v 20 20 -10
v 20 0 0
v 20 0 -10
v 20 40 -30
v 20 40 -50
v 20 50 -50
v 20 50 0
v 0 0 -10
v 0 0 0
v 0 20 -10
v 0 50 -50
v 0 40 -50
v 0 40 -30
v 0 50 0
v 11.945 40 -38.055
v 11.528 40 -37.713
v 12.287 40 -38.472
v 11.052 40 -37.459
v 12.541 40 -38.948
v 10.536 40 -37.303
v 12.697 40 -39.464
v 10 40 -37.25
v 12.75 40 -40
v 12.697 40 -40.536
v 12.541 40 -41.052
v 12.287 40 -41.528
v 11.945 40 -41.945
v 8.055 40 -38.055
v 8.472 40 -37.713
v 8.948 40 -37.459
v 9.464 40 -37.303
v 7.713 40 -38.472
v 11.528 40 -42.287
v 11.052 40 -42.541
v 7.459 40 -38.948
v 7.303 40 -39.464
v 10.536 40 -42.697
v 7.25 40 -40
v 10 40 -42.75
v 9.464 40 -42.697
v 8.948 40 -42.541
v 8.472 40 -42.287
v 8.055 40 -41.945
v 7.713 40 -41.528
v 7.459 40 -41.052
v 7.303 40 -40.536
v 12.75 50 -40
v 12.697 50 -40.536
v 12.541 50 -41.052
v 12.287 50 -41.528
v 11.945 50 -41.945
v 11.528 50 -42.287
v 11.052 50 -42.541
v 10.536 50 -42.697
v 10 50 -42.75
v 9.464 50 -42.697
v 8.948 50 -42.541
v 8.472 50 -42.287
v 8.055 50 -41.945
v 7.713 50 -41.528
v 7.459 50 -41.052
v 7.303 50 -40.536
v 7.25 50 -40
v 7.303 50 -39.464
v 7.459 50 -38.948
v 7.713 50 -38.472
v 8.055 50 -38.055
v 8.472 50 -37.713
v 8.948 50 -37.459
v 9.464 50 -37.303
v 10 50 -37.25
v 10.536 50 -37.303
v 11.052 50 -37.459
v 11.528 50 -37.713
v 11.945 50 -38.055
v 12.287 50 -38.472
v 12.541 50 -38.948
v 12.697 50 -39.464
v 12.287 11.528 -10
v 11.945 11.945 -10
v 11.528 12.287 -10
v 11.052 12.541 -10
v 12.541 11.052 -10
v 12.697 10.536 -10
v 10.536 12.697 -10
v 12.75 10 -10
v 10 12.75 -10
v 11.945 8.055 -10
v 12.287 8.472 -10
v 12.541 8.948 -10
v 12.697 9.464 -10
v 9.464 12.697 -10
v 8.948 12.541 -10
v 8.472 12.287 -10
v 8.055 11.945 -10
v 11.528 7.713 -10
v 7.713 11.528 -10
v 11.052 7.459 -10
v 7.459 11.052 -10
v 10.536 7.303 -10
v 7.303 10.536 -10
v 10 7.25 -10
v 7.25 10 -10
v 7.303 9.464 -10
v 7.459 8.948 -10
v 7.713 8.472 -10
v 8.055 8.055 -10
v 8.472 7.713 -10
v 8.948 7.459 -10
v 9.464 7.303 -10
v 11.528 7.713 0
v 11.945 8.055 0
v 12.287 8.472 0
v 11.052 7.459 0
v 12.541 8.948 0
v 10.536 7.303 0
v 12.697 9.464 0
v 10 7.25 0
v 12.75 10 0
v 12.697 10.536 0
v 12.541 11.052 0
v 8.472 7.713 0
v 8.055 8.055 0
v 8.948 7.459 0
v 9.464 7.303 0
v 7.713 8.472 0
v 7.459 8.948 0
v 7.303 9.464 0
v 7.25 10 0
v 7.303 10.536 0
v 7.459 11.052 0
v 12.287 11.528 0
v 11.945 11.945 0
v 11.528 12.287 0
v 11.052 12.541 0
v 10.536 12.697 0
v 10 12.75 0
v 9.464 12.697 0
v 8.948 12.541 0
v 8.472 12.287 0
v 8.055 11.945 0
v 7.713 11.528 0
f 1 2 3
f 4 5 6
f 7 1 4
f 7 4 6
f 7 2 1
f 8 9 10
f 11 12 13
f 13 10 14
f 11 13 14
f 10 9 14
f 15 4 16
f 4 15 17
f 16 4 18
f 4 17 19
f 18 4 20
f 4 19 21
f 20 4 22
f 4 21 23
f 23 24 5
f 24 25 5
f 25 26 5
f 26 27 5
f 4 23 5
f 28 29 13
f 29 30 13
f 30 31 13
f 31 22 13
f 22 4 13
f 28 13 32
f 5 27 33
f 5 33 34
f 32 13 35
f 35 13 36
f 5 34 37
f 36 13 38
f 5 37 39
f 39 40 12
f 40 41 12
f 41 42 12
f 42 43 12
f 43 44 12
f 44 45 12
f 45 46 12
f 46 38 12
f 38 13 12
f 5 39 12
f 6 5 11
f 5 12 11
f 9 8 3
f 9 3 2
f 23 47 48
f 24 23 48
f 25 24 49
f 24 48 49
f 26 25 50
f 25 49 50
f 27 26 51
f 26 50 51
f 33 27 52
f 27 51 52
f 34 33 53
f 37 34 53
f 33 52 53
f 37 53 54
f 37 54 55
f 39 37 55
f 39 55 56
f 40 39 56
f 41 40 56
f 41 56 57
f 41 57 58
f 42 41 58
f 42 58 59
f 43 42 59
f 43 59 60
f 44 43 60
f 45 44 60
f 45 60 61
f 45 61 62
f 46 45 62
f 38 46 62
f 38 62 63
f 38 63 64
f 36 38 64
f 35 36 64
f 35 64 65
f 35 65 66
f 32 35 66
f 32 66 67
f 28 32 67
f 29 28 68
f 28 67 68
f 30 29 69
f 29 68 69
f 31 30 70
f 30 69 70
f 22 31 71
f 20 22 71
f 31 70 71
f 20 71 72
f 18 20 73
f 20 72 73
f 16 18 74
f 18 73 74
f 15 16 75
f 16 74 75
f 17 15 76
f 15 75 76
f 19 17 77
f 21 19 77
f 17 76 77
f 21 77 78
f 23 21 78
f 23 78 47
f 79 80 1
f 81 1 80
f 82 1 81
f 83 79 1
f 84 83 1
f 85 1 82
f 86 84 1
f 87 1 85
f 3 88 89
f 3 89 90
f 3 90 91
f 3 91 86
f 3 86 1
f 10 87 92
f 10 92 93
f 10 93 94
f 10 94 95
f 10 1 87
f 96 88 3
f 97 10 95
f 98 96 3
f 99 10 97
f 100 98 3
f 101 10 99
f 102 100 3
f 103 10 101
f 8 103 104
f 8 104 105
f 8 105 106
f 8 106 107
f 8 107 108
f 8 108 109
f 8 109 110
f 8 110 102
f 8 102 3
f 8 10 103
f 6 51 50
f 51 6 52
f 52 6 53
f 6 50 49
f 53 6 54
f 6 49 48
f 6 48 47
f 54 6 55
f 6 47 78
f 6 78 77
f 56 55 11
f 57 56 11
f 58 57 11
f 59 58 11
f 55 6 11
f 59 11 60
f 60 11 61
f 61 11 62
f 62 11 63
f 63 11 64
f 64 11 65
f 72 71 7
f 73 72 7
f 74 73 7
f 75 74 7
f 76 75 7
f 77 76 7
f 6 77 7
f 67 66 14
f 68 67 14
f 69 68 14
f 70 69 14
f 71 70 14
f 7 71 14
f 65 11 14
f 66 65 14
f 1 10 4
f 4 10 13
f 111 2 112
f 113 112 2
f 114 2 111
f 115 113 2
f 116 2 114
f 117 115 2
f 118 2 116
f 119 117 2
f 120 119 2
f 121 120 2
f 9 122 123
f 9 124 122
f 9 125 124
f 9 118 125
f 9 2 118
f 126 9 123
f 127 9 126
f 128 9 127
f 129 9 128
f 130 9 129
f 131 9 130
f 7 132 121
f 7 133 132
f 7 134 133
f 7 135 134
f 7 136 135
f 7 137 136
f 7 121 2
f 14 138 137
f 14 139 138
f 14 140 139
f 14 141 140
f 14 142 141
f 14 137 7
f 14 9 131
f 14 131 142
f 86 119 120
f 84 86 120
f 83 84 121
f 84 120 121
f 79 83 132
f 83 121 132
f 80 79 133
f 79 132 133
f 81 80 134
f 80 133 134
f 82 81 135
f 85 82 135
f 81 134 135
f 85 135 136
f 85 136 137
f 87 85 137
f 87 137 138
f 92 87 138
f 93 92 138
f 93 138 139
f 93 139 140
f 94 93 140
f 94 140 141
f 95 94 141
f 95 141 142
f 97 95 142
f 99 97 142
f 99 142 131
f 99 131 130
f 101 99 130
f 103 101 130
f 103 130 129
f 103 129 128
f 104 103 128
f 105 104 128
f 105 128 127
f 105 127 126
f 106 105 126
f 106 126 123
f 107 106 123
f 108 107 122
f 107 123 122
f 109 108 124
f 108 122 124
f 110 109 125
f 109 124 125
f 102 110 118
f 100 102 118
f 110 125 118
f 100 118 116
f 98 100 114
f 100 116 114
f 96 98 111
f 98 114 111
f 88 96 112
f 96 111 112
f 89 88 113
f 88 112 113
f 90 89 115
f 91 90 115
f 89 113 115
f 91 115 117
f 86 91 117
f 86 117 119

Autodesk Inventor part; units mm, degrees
ref_plane "YZ Plane" through (0, 0, 0) normal (1, 0, 0) x (0, 1, 0)
ref_plane "XZ Plane" through (0, 0, 0) normal (0, 1, 0) x (-1, 0, 0)
ref_plane "XY Plane" through (0, 0, 0) normal (0, 0, 1) x (1, 0, 0)
sketch "Sketch1" plane through (0, 0, 0) normal (1, 0, 0) x (0, 1, 0)
  line L0 (0, 0) -> (20, 0)
  line L1 (20, 0) -> (20, -10)
  line L2 (20, -10) -> (0, -10)
  line L3 (0, -10) -> (0, 0)
  line L4 (20, -10) -> (50, -10)
  line L5 (50, -10) -> (50, 0)
  line L6 (50, 0) -> (20, 0)
  line L7 (20, 0) -> (20, -10)
  line L8 (50, 0) -> (40, 0)
  line L9 (40, 0) -> (40, -50)
  line L10 (40, -50) -> (50, -50)
  line L11 (50, -50) -> (50, 0)
  line L12 (40, -50) -> (50, -50)
  line L13 (50, -50) -> (50, -30)
  line L14 (50, -30) -> (40, -30)
  line L15 (40, -30) -> (40, -50)
  line L16 (20, -10) -> (40, -30)
  line L17 (40, -10) -> (20, -10)
  line L18 (40, -10) -> (40, -30)
  dimension "d0" = 20
  dimension "d1" = 10
  dimension "d2" = 30
  dimension "d3" = 10
  dimension "d4" = 10
  dimension "d5" = 50
  dimension "d6" = 10
  dimension "d7" = 20
extrude "Extrusion1" add sketch "Sketch1" along normal blind 20
sketch "Sketch2" plane through (0, 50, 0) normal (0, 1, 0) x (1, 0, 0)
  circle A0 centre (10, 40) radius 2.75
  line L0 (20, 50) -> (20, 0) projected
  line L1 (0, 50) -> (20, 50) projected
  point P0 (0, 0)
  dimension "d10" = 5.5
  dimension "d11" = 10
  dimension "d12" = 10
extrude "Extrusion2" cut sketch "Sketch2" against normal blind 20
sketch "Sketch3" plane through (0, 0, 0) normal (0, 0, 1) x (1, 0, 0)
  circle A0 centre (10, 10) radius 2.75
  line L0 (0, 0) -> (20, 0) projected
  line L1 (20, 50) -> (20, 0) projected
  dimension "d15" = 5.5
  dimension "d16" = 10
  dimension "d17" = 10
extrude "Extrusion3" cut sketch "Sketch3" against normal blind 20
properties part number "Standard Bracing" material "Aluminum 6061"
